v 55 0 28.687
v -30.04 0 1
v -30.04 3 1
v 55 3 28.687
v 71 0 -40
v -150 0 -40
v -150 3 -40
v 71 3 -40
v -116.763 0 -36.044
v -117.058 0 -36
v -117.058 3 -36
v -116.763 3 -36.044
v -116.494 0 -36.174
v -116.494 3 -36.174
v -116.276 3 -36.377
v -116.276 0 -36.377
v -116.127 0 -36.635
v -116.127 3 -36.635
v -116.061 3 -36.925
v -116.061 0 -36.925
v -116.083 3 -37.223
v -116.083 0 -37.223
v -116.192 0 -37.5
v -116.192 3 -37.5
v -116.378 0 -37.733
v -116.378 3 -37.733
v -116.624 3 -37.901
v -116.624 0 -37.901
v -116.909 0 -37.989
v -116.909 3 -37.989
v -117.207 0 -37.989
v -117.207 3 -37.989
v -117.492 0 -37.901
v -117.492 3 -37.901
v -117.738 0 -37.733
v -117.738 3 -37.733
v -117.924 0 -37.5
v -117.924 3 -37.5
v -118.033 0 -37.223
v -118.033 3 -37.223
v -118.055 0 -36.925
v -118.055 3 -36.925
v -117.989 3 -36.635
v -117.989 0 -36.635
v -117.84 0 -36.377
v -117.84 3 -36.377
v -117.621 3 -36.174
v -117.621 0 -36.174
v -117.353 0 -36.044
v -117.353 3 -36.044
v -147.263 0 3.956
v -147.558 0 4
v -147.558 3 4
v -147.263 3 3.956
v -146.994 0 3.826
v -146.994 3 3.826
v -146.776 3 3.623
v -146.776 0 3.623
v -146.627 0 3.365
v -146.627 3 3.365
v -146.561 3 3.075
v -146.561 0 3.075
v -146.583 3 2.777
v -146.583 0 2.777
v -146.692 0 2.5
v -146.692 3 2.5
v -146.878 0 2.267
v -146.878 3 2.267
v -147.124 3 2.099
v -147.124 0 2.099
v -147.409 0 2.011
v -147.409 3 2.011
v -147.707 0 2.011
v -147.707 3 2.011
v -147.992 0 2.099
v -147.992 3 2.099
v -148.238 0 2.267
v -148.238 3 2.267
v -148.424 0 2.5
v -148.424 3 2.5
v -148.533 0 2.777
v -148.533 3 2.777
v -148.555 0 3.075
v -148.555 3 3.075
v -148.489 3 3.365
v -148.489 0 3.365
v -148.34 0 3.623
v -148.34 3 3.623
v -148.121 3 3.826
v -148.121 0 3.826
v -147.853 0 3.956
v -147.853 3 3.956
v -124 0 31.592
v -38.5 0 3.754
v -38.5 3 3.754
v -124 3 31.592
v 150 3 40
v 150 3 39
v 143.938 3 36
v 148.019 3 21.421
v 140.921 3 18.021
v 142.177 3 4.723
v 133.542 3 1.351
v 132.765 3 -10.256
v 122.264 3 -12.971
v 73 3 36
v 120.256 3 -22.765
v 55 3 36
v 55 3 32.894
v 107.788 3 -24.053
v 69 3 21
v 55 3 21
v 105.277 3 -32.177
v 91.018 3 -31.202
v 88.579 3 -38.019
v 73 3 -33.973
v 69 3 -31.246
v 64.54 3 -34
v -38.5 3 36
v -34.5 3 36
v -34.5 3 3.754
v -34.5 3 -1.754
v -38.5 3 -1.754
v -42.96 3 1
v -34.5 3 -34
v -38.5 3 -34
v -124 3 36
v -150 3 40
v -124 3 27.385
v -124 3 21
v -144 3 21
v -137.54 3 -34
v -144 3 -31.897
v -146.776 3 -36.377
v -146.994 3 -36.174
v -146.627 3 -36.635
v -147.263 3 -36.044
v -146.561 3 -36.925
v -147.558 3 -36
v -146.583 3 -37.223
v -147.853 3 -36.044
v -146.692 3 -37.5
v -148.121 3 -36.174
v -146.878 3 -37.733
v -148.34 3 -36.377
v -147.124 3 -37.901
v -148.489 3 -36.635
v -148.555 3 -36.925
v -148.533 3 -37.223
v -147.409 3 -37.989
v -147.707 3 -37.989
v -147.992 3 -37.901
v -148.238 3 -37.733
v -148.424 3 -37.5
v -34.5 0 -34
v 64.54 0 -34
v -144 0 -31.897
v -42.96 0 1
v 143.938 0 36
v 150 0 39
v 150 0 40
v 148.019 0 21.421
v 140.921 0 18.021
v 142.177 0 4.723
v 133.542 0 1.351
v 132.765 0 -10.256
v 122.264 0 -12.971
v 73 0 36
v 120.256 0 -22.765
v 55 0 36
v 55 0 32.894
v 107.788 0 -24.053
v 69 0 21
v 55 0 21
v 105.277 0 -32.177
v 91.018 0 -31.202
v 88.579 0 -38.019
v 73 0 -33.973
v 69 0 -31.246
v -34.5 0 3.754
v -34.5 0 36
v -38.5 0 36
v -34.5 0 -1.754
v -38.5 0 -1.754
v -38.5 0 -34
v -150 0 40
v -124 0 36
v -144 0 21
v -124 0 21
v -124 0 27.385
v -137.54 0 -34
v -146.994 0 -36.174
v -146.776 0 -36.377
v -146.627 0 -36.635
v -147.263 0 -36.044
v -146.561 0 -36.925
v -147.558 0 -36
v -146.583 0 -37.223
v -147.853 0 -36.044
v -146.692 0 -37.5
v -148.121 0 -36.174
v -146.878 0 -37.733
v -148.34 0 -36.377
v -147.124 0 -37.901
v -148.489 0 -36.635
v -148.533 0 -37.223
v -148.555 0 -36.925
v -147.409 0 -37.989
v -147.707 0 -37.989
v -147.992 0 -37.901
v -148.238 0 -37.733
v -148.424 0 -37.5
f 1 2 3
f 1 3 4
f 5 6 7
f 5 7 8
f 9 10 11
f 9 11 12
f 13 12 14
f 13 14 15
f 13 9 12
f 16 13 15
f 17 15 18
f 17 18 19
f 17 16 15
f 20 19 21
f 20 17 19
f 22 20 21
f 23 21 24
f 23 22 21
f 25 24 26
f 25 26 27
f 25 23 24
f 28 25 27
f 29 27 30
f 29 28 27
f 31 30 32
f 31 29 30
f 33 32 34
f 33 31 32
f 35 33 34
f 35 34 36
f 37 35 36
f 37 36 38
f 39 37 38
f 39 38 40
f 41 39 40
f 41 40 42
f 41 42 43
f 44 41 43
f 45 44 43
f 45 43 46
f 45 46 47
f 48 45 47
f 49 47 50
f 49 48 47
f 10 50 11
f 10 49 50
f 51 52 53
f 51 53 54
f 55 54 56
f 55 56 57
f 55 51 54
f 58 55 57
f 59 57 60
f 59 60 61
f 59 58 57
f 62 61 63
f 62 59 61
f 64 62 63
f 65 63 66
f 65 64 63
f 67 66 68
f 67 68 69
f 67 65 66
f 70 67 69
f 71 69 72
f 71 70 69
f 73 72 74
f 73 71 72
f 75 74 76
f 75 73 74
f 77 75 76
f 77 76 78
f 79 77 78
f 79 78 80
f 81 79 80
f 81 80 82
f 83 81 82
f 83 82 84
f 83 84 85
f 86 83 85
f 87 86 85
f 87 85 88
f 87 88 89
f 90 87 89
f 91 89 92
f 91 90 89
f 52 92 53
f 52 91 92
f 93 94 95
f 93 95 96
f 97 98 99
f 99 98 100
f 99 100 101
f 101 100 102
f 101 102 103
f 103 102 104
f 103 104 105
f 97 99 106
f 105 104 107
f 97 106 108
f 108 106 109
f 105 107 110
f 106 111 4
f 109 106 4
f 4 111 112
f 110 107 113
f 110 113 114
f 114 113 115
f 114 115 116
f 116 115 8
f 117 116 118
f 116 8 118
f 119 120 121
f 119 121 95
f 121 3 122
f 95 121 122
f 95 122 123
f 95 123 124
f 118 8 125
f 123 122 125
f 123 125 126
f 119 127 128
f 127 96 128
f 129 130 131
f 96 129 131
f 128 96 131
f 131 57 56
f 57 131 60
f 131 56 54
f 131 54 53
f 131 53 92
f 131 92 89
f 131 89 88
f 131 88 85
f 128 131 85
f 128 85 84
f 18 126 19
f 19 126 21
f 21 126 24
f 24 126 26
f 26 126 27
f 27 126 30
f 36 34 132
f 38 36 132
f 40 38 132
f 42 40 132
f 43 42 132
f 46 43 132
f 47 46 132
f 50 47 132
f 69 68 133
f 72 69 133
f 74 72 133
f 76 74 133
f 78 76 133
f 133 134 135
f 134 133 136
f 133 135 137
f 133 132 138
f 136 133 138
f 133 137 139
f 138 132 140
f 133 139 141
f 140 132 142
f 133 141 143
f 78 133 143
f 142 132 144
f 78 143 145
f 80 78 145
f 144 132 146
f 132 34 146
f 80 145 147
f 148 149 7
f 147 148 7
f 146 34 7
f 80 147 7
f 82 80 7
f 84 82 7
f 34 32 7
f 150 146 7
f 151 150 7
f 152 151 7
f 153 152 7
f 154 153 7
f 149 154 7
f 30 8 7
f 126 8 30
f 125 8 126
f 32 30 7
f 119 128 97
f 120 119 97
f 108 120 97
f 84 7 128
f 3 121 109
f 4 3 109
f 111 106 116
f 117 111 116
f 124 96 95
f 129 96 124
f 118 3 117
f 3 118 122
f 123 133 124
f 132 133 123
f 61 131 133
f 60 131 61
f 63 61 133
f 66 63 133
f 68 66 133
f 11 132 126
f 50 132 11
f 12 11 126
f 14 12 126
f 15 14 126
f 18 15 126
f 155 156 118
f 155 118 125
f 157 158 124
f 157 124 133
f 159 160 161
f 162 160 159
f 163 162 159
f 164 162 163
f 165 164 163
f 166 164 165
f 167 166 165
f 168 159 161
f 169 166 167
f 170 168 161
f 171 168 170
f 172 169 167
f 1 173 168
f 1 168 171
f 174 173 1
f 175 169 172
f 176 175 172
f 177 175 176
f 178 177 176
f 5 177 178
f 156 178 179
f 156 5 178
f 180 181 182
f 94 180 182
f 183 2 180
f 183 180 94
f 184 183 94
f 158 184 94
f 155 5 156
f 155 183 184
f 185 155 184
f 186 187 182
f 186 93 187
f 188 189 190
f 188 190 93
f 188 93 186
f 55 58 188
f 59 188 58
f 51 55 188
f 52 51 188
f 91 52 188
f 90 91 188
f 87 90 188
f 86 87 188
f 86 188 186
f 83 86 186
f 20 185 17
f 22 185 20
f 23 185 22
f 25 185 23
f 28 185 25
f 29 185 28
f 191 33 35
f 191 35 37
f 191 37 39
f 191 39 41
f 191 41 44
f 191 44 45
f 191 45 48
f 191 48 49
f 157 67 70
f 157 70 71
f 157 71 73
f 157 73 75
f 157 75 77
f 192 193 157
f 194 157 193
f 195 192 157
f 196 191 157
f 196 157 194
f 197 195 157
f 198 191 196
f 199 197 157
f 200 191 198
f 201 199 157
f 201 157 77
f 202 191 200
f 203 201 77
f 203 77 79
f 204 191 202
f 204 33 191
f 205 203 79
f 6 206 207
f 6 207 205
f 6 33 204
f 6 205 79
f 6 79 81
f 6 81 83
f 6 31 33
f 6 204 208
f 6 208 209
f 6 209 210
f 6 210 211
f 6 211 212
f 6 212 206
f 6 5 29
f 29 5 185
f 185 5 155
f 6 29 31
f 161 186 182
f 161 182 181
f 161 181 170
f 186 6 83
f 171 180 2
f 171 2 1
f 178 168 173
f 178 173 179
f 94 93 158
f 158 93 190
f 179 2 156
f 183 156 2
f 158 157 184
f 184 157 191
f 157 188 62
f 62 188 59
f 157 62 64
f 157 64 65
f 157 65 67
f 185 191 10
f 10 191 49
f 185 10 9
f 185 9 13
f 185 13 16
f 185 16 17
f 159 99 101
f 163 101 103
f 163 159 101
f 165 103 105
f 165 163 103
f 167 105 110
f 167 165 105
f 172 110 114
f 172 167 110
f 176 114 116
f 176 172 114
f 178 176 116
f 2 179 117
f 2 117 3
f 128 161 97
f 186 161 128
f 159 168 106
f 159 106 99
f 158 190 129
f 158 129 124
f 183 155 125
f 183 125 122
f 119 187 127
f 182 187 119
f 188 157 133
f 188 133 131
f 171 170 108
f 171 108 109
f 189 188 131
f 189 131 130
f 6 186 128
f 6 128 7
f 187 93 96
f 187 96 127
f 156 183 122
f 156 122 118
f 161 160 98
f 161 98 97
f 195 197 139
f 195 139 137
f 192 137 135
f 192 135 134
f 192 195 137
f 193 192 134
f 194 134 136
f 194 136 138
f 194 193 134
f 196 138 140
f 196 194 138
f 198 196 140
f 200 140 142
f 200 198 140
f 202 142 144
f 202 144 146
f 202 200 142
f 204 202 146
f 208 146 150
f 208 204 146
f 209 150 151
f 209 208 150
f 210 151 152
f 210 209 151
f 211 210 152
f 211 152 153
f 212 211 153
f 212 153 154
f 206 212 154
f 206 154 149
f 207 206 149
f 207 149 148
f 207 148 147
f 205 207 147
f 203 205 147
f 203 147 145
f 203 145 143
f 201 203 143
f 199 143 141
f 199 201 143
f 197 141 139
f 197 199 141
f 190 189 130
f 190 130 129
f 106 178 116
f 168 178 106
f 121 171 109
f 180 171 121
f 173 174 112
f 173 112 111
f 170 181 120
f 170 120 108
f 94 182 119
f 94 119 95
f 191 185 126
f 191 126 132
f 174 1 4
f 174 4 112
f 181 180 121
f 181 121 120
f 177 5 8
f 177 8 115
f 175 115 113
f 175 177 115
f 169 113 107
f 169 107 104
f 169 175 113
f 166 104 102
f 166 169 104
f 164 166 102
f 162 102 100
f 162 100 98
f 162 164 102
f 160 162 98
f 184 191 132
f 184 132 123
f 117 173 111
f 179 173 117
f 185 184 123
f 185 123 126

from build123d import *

# Parameters (mm, degrees)
SKETCH_1_R          = 1
EXTRUDE_1_DEPTH     = 3
CUT_EXTRUDE_2_DEPTH = 18


with BuildPart() as part:
    # 草图1 → 凸台-拉伸1 (new body)
    with BuildSketch(Plane(origin=(0, 0, 0), x_dir=(1, 0, 0), z_dir=(0, 1, 0))):
        with BuildLine():
            Line((-150, 40), (71, 40))
            ThreePointArc((71, 40), (126.861435714, 16.861435714), (150, -39))
            Line((150, -39), (150, -40))
            Line((150, -40), (-150, -40))
            Line((-150, -40), (-150, 40))
        make_face()
        with Locations(Location((-117.057778193, 37, 0), (0, 0, 270))):
            Circle(SKETCH_1_R, mode=Mode.SUBTRACT)
        with Locations(Location((-147.557778193, 37, 0), (0, 0, 270))):
            Circle(SKETCH_1_R, mode=Mode.SUBTRACT)
        with Locations(Location((-147.557778193, -3, 0), (0, 0, 270))):
            Circle(SKETCH_1_R, mode=Mode.SUBTRACT)
    extrude(amount=EXTRUDE_1_DEPTH)

    # 草图4 → 切除-拉伸2 (cut)
    with BuildSketch(Plane(origin=(0, 0, 0), x_dir=(1, 0, 0), z_dir=(0, 1, 0))):
        with BuildLine():
            ThreePointArc((143.938330115, -36), (122.26382188, 12.971343703), (73, 33.972597597))
            Line((73, 33.972597597), (73, -36))
            Line((73, -36), (143.938330115, -36))
        make_face()
        Polygon((-34.5, 1.754496568), (64.53976054, 34), (-34.5, 34), align=None)
        Polygon((69, -21), (69, 31.245503432), (-30.03976054, -1), (55, -28.687363897), (55, -21), align=None)
        Polygon((-38.5, 1.754496568), (-38.5, 34), (-137.53976054, 34), align=None)
        Polygon((55, -36), (55, -32.894031452), (-34.5, -3.754496568), (-34.5, -36), align=None)
        Polygon((-124, -27.385038315), (-42.96023946, -1), (-144, 31.896666222), (-144, -21), (-124, -21), align=None)
        Polygon((-38.5, -36), (-38.5, -3.754496568), (-124, -31.591705871), (-124, -36), align=None)
    extrude(amount=CUT_EXTRUDE_2_DEPTH, mode=Mode.SUBTRACT)


solid = part.part
